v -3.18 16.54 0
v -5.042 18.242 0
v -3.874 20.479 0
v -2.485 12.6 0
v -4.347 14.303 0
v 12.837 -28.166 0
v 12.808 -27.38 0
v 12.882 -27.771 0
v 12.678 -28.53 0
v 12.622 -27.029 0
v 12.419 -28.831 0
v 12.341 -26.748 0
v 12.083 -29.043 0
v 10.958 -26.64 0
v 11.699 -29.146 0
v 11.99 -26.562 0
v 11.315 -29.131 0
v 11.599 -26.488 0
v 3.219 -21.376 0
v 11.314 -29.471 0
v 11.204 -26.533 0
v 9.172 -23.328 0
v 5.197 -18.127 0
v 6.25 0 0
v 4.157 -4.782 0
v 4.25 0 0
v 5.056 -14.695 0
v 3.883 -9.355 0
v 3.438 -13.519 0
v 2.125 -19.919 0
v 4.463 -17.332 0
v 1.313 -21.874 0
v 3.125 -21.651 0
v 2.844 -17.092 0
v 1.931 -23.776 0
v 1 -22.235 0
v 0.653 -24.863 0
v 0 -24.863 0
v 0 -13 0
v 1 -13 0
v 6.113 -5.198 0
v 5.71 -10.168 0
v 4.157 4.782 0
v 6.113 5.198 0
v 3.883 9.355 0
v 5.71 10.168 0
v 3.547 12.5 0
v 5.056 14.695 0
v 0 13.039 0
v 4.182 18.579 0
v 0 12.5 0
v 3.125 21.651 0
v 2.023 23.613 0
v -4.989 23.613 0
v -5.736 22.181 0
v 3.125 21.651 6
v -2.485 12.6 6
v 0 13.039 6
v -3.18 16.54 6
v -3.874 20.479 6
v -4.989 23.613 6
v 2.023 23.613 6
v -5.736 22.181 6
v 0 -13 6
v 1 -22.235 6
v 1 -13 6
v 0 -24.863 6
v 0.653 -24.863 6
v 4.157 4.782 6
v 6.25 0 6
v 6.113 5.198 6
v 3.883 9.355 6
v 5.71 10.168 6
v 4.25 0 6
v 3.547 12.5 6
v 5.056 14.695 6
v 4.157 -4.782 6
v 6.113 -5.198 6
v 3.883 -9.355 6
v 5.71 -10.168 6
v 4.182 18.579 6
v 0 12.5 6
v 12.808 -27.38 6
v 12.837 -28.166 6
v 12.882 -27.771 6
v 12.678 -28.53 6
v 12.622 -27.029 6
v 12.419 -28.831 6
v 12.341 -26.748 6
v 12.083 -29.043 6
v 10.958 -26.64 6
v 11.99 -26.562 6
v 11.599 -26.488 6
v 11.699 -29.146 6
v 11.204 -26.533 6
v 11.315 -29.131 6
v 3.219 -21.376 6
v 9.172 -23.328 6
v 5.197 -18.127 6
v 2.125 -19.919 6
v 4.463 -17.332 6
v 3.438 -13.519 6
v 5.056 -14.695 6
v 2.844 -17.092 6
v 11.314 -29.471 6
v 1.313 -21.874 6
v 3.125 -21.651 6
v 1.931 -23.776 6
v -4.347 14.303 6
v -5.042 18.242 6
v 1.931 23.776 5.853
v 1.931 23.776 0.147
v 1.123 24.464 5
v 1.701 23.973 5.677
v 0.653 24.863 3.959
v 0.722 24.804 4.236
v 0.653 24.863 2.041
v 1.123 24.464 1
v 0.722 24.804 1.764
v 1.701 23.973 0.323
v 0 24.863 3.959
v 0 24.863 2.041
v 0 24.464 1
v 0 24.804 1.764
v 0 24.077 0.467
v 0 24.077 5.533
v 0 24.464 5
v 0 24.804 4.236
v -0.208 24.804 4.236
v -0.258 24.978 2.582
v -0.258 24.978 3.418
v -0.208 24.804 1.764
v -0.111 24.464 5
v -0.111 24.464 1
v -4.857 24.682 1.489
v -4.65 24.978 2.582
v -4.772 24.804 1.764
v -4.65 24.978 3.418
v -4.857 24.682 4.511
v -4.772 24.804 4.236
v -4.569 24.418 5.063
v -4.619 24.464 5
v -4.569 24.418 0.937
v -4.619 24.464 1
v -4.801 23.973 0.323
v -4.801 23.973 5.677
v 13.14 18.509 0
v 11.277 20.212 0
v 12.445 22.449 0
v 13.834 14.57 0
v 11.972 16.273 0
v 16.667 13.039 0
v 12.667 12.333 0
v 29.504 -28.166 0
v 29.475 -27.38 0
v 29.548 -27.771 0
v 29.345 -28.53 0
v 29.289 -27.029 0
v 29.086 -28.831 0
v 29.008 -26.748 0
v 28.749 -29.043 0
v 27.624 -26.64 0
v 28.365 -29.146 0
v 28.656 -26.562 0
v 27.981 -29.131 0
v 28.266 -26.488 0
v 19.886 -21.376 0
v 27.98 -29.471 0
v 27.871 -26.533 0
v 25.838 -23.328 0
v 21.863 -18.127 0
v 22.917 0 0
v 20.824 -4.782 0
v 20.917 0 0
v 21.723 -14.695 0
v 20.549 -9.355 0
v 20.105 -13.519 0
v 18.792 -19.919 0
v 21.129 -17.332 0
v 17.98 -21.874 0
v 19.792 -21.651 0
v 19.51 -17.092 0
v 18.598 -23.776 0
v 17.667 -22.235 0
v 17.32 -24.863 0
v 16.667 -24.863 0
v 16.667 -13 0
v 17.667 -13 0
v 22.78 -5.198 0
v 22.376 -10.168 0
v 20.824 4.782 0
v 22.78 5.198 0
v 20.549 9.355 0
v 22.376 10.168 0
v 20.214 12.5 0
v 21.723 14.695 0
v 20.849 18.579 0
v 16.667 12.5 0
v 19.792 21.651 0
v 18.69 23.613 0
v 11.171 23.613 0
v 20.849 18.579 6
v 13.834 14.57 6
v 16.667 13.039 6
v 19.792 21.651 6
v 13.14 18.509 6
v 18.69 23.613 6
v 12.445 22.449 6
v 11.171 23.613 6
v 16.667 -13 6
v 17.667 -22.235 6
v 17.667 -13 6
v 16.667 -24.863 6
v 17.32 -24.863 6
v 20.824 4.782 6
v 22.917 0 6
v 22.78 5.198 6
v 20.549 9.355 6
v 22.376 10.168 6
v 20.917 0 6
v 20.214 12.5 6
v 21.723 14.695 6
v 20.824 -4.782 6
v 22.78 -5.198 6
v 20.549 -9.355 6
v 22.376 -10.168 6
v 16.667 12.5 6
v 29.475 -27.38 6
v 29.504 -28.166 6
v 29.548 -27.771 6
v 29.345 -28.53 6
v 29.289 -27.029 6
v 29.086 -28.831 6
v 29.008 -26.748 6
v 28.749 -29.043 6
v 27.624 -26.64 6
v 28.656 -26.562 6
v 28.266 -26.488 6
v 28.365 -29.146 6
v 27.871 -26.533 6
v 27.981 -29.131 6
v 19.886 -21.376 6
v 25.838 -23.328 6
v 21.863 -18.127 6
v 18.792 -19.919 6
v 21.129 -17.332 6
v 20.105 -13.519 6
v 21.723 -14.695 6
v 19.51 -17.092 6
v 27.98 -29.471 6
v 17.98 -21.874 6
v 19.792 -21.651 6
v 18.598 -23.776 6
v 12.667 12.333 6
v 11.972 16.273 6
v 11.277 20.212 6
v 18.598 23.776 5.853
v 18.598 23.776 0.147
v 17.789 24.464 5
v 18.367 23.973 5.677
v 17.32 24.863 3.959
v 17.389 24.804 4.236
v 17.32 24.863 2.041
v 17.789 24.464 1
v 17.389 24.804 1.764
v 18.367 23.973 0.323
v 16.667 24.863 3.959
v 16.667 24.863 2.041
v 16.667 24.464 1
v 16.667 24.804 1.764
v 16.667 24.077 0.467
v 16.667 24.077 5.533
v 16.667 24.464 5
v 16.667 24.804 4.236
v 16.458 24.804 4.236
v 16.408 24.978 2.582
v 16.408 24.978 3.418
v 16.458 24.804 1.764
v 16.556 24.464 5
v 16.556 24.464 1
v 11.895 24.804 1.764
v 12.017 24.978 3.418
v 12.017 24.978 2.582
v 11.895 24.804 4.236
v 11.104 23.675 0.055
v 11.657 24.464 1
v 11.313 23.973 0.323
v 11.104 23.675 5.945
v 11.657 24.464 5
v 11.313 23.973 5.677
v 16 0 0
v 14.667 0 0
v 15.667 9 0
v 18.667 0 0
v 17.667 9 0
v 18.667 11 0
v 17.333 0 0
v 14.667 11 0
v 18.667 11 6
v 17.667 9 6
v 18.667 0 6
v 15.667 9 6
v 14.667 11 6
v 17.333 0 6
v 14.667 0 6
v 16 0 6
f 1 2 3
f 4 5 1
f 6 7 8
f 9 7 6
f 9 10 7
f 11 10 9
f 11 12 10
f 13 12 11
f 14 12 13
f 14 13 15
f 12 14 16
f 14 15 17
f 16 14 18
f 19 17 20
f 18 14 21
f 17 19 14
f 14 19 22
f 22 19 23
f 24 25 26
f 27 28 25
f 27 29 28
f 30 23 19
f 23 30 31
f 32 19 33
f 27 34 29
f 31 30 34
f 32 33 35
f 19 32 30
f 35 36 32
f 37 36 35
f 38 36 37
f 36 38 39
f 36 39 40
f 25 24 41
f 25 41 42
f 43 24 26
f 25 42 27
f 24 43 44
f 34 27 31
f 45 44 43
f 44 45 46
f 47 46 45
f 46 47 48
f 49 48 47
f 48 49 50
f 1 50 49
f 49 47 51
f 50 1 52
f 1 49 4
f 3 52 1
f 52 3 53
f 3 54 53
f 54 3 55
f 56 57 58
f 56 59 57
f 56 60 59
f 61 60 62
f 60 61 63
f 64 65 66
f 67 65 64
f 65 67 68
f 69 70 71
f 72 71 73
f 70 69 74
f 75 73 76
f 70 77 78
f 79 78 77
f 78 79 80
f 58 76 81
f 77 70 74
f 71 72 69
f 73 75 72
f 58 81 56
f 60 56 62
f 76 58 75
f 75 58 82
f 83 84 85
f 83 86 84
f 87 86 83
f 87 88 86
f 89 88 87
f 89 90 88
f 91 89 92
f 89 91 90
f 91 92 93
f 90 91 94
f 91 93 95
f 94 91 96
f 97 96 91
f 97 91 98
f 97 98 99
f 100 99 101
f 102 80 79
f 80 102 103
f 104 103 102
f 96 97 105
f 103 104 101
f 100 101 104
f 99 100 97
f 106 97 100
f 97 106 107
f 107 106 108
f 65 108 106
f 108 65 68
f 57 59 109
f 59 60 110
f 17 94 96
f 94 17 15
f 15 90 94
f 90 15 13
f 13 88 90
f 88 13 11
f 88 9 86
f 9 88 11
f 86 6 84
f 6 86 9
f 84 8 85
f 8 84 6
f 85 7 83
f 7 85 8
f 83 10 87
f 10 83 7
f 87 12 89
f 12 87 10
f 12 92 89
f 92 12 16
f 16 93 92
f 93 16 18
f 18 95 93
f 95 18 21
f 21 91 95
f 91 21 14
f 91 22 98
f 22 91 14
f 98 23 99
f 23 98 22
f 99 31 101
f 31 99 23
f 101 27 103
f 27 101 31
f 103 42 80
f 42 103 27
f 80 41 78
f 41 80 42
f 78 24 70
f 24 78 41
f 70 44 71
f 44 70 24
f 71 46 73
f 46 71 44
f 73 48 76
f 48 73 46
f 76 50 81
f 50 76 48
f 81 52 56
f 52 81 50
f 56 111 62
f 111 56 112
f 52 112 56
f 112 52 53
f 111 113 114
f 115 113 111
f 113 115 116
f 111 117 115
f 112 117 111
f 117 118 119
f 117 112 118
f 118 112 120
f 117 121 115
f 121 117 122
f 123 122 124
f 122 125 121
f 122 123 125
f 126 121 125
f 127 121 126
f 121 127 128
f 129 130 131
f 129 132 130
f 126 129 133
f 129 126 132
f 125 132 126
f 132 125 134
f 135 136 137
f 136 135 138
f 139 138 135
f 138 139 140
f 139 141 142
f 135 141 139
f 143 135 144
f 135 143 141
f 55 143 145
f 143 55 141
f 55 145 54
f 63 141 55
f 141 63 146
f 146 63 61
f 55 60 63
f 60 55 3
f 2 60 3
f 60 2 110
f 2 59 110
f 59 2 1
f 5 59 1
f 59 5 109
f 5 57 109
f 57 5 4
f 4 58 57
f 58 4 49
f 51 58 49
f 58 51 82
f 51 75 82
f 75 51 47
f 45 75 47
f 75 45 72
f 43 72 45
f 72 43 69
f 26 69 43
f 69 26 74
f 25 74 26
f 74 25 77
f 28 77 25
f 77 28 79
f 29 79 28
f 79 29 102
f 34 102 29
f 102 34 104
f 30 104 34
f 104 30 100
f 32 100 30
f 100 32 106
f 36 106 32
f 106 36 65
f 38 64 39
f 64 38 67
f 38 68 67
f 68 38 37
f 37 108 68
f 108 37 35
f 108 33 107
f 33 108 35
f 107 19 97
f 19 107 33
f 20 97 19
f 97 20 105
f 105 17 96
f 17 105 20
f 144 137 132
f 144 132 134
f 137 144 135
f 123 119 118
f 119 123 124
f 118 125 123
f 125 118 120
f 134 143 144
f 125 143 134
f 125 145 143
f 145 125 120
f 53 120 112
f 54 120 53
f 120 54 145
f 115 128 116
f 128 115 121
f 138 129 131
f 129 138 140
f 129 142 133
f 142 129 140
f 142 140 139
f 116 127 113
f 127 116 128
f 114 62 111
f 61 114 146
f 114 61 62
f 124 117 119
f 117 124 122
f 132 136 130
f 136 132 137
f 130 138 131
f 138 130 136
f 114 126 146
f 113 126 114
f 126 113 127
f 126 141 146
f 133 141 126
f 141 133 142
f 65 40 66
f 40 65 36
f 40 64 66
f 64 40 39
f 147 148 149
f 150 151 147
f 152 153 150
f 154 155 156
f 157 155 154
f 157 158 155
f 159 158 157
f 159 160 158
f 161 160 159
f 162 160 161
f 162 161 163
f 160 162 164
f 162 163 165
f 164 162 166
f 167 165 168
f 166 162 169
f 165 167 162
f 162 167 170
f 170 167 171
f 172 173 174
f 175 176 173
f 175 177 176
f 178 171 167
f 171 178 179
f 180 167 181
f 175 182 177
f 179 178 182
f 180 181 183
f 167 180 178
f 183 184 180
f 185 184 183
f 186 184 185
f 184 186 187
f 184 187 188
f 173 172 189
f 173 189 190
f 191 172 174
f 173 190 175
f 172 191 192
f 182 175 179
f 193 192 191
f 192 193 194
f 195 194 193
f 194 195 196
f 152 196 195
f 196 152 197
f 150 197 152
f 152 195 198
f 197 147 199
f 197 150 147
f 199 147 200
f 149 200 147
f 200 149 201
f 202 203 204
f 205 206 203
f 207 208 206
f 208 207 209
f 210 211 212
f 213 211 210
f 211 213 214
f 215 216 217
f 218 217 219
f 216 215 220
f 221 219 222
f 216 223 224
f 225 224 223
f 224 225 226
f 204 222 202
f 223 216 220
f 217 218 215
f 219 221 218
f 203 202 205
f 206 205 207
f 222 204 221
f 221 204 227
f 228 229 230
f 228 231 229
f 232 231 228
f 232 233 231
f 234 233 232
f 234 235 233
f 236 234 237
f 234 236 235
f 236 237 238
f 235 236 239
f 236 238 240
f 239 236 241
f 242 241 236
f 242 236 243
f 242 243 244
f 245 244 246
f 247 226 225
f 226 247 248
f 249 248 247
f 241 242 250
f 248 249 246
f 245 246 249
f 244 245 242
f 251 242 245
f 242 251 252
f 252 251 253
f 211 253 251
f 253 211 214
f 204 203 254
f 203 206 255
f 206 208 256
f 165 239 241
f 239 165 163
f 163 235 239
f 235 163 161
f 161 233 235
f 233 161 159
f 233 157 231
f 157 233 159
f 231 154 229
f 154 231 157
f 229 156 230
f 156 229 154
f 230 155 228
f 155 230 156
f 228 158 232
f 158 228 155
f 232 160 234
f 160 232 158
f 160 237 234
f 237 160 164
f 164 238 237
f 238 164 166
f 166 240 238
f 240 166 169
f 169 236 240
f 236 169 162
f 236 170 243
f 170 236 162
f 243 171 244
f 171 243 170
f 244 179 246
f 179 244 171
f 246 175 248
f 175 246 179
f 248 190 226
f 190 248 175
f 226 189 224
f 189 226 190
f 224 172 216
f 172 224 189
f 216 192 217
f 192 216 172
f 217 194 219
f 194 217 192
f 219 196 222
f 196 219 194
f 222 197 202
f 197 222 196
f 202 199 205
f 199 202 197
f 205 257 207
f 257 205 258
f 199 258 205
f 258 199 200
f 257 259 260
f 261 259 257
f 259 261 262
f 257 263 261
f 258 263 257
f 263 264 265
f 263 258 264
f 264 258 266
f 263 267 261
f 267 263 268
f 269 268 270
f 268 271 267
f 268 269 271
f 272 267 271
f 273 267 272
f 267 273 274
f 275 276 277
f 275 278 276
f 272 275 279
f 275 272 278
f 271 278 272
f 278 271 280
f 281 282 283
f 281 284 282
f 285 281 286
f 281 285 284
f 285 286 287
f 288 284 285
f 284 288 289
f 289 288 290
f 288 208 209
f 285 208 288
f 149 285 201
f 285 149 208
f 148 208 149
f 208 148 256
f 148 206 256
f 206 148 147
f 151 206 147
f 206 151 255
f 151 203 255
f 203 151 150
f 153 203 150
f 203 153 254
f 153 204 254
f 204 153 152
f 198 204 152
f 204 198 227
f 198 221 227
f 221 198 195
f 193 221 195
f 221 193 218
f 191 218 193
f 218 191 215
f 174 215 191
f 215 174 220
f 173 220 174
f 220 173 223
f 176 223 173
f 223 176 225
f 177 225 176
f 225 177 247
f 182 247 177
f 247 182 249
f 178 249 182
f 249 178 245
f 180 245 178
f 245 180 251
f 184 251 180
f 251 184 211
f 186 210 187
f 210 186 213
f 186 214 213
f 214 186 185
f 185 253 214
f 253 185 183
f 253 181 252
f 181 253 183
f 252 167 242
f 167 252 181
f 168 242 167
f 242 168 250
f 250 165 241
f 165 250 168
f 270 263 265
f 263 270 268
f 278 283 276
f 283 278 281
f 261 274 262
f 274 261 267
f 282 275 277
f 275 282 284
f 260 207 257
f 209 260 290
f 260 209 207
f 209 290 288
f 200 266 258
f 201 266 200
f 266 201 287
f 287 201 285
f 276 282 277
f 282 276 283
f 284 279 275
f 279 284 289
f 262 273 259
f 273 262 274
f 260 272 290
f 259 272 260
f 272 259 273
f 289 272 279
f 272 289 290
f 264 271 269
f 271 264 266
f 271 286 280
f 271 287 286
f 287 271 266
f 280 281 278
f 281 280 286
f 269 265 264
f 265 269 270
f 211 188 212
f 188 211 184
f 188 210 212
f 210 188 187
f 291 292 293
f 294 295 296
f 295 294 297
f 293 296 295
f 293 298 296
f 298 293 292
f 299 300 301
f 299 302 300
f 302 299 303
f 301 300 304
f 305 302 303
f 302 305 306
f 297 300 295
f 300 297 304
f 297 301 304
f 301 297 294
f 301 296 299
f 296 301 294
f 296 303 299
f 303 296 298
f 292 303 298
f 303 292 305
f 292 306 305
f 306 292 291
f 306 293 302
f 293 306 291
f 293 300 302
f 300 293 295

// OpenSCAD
//
//  Copyright (C) 15-05-2013 Jasper den Ouden.
//
//  This is free software: you can redistribute it and/or modify
//  it under the terms of the GNU General Public License as published
//  by the Free Software Foundation, either version 3 of the License, or
//  (at your option) any later version.
//

// Clamp profile and application with 5mm pole system.

$quality=30;
$fs=0.4;

t=4; //Thicknesses.
l= 50; //Length of clamp.
h = 1.5*t;

zl = t; //Single zigzag length.
zw = zl/1.3;

tab=true;
logo=true;

hl = 20; //Handle length.
ha = 45; //.. angle
ht = t;  //.. thickness

module teeth_profile(oz,l=l)
{   difference()
    {   union()
        {   square([1.5*t,l-1.5*t]);
            intersection() 
            {   translate([0,l-1.5*t]) circle(1.5*t);
                square([1.5*t,l]);
            }
        }
        //Zigzag motion.
        for( y = [oz : zl : l] ) 
            translate([0,y]) scale([zw/zl,1]) rotate(45) square([zl,zl]/sqrt(2), center=true);
        //Entry at top.
        translate([0,l]) rotate(45) square(t*[2,2], center=true);
    }
}

module clamp_profile(oz)
{   union()
    {   difference()
        {   union()
            {   scale([1/2,2]/4) circle(l); //Arc.
                if( hl > 0 ) translate([0,-l/4]) rotate(180+ha) union()//Handle
                {   intersection() 
                    {   square([ht,hl]);
                        translate([ht,0]) scale([ht,hl]) circle(1);
                    }
                    translate([2*ht/3,hl-ht/4]) circle(ht/3);
                }
            }
            difference()
            {   scale([1/2-2*t/l,2-2*t/l]/4) circle(l); //Hole and reinforcement.
                translate([5*l,l/2]) square([10*l,l/2],center=true);
            }
            translate([-l,-l]) square([l,2*l]); //Half it.
        }
        //Pad.
        translate([-t,t+l/6]) 
            rotate(10) intersection(){ teeth_profile(oz,l/3); square([l,l/3-t],r=t/3); }
    }
}

peg_connect = false; //Old way of connecting the two parts.
module peg_profile()
{   polygon([[+1,-1],[-1,+1],[+1,+1]]*t/2); }

module half_clamp(oz)
{
    union()
    {   intersection()
        {   linear_extrude(height=h) difference()
            {   clamp_profile(oz);
                if(peg_connect) union()
                {   for( y=[0,1.6*t] ) translate([0,y-l/2+t]) rotate(45) 
                                           square(sqrt(2)*t,r=t/4,center=true);
                    translate([0,-l/2]) square([2*t,2*t],center=true);
                }
            }
            rotate([0,90]) translate([0,0,-l]) linear_extrude(height=3*l) 
                translate([-h/2,l/2-h/1.5]) union()
            {   circle(h/1.5);
                translate([0,-l]) square([2*h/1.5, 2*l],center=true);
             }
        }
        //Old peg system to connect them.(pretty poor, at least at the scale i tried)
        if(peg_connect) for( y = [0,1.6*t] ) translate([0,y-l/2+t]) union()
        {   linear_extrude(height=h/2) 
                rotate(45) difference()
            {   square(sqrt(2)*t,r=t/4,center=true);
                rotate(-90) peg_profile();
            }
            rotate(135) linear_extrude(height=h) peg_profile();
        }
        translate([0,t/4-l/2]) cube([t/4,h+5*t/4,h]); //Thing to hold the backside together.
    }
}

module wedge()
{
    linear_extrude(height=h) difference()
    {   translate([0,1.5*h+t/2]/2) square([t,1.5*h+t/2], center=true);
        polygon([[+t/4,1.5*h], [-t/4,1.5*h], [-t/6,0], [+t/6,0]]);
    }
}

module clamp_pair()
{   union()
    {   half_clamp(0);
        translate([l/3,0]) half_clamp(zl/2);
        translate([l/3,0]) wedge();
    }
}
clamp_pair();
